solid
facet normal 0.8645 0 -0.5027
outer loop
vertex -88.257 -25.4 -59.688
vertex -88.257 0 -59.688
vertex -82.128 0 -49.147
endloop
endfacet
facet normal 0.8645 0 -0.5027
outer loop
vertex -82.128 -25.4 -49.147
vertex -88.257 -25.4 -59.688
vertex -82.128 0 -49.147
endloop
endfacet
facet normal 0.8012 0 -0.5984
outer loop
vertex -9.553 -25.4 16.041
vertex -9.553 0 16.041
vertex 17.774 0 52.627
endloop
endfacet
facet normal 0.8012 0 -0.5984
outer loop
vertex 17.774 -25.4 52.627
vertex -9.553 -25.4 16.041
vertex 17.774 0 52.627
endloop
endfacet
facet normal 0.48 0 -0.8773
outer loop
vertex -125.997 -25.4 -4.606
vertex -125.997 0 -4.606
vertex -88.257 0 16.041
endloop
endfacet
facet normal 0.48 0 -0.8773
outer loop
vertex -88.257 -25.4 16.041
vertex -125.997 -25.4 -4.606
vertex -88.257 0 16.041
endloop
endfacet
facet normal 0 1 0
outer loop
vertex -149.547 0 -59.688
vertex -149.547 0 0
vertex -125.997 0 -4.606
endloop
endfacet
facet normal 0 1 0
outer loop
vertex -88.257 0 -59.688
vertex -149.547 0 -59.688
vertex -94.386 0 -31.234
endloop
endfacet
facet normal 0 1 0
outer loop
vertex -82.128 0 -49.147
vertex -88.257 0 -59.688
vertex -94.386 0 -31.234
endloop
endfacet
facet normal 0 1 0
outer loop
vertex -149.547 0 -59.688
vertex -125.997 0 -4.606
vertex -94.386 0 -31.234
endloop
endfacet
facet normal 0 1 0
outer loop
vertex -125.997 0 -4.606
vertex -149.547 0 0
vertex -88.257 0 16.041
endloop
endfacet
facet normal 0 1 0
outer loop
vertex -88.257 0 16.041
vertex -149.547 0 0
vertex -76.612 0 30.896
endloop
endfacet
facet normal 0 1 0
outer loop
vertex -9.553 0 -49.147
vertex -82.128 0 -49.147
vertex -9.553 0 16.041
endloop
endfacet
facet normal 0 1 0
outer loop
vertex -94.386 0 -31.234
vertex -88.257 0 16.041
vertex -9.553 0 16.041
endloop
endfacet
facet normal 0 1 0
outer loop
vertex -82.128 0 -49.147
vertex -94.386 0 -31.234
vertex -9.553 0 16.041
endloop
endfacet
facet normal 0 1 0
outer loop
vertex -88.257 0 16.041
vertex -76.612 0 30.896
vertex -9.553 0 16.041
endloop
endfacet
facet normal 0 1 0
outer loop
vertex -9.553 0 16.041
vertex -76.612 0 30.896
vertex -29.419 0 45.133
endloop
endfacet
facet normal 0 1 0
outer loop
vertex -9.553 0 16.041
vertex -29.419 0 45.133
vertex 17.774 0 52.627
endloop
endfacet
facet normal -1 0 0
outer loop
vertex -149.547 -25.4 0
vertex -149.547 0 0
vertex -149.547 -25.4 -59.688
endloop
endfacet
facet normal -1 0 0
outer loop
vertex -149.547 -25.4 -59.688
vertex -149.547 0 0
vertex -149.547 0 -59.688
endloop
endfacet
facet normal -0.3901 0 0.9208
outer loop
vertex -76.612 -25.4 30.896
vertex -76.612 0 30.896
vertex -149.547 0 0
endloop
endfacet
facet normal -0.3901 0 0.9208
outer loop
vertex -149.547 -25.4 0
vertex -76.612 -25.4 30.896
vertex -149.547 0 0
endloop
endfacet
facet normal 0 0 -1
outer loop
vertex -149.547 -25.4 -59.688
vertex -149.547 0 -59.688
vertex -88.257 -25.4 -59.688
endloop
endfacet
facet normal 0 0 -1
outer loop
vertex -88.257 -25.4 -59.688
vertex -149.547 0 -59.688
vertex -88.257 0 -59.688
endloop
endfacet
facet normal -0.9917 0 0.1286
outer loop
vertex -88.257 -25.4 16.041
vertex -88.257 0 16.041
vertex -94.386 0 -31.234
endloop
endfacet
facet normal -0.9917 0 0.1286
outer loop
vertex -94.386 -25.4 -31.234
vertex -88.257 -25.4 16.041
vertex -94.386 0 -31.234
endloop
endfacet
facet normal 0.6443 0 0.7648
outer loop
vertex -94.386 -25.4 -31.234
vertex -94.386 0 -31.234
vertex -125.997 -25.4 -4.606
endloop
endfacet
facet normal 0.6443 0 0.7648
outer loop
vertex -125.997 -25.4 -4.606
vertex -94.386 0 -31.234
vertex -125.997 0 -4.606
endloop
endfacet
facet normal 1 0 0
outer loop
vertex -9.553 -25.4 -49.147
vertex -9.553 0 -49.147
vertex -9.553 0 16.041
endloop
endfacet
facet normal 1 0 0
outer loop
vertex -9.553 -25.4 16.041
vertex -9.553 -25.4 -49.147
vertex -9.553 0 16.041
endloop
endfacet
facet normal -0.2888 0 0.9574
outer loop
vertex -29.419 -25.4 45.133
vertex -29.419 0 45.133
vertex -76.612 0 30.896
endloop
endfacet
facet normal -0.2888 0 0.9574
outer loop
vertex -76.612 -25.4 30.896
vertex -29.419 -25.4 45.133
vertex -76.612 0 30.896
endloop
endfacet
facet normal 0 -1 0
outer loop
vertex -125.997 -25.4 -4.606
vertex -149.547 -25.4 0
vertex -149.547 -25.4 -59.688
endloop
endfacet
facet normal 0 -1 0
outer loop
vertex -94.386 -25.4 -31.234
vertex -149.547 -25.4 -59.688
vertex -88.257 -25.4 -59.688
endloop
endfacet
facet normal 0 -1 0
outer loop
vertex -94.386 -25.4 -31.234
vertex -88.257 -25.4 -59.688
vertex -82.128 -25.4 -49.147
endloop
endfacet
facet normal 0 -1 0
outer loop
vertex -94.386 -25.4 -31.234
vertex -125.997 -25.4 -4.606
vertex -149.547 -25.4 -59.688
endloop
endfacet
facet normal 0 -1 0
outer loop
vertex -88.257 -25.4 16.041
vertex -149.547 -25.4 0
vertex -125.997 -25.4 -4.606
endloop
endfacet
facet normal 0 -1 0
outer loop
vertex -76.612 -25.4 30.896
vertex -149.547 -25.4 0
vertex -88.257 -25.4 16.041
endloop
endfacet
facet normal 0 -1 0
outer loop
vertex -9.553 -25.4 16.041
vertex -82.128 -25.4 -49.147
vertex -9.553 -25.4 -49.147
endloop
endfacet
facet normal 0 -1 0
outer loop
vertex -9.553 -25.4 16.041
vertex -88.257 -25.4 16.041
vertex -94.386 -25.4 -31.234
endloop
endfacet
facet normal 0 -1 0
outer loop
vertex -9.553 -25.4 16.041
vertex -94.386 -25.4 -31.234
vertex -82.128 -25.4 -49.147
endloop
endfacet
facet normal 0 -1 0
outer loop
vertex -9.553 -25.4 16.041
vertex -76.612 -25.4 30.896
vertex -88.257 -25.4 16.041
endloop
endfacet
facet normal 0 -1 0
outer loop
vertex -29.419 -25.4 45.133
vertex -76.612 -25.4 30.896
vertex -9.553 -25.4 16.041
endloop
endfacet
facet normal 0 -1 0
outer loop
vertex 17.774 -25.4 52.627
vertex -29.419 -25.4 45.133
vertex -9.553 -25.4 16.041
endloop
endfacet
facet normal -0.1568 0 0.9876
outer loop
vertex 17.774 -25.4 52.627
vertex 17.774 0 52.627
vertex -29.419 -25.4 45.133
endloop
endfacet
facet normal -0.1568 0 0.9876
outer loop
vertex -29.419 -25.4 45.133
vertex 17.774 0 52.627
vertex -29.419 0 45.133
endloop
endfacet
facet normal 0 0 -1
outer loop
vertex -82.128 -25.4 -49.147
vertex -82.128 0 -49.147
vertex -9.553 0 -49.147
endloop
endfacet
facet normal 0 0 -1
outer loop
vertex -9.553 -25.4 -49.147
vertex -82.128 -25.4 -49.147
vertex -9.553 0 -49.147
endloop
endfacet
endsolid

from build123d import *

# Parameters (mm, degrees)
F1_DEPTH = 25.4


with BuildPart() as f1:
    # F0 (on Front) → F1 (new body)
    with BuildSketch(Plane.XZ):
        Polygon((-88.257447, -59.687648), (-82.12845, -49.147233), (-134.837762, -49.147233), (-143.809088, -14.351459), (-125.996976, -4.606415), (-88.257447, 16.040962), (-76.612361, 30.896192), (-149.547338, 0), (-149.547338, -59.687648), align=None)
        Polygon((-134.837762, -49.147233), (-82.12845, -49.147233), (-9.55318, -49.147233), (-9.55318, 16.040962), (-88.257447, 16.040962), (-94.386436, -31.234344), (-125.996976, -4.606415), (-143.809088, -14.351459), align=None)
        Polygon((-88.257447, 16.040962), (-9.55318, 16.040962), (17.77407, 52.627109), (-29.419146, 45.1326), (-76.612361, 30.896192), align=None)
    extrude(amount=F1_DEPTH)


solid = f1.part
